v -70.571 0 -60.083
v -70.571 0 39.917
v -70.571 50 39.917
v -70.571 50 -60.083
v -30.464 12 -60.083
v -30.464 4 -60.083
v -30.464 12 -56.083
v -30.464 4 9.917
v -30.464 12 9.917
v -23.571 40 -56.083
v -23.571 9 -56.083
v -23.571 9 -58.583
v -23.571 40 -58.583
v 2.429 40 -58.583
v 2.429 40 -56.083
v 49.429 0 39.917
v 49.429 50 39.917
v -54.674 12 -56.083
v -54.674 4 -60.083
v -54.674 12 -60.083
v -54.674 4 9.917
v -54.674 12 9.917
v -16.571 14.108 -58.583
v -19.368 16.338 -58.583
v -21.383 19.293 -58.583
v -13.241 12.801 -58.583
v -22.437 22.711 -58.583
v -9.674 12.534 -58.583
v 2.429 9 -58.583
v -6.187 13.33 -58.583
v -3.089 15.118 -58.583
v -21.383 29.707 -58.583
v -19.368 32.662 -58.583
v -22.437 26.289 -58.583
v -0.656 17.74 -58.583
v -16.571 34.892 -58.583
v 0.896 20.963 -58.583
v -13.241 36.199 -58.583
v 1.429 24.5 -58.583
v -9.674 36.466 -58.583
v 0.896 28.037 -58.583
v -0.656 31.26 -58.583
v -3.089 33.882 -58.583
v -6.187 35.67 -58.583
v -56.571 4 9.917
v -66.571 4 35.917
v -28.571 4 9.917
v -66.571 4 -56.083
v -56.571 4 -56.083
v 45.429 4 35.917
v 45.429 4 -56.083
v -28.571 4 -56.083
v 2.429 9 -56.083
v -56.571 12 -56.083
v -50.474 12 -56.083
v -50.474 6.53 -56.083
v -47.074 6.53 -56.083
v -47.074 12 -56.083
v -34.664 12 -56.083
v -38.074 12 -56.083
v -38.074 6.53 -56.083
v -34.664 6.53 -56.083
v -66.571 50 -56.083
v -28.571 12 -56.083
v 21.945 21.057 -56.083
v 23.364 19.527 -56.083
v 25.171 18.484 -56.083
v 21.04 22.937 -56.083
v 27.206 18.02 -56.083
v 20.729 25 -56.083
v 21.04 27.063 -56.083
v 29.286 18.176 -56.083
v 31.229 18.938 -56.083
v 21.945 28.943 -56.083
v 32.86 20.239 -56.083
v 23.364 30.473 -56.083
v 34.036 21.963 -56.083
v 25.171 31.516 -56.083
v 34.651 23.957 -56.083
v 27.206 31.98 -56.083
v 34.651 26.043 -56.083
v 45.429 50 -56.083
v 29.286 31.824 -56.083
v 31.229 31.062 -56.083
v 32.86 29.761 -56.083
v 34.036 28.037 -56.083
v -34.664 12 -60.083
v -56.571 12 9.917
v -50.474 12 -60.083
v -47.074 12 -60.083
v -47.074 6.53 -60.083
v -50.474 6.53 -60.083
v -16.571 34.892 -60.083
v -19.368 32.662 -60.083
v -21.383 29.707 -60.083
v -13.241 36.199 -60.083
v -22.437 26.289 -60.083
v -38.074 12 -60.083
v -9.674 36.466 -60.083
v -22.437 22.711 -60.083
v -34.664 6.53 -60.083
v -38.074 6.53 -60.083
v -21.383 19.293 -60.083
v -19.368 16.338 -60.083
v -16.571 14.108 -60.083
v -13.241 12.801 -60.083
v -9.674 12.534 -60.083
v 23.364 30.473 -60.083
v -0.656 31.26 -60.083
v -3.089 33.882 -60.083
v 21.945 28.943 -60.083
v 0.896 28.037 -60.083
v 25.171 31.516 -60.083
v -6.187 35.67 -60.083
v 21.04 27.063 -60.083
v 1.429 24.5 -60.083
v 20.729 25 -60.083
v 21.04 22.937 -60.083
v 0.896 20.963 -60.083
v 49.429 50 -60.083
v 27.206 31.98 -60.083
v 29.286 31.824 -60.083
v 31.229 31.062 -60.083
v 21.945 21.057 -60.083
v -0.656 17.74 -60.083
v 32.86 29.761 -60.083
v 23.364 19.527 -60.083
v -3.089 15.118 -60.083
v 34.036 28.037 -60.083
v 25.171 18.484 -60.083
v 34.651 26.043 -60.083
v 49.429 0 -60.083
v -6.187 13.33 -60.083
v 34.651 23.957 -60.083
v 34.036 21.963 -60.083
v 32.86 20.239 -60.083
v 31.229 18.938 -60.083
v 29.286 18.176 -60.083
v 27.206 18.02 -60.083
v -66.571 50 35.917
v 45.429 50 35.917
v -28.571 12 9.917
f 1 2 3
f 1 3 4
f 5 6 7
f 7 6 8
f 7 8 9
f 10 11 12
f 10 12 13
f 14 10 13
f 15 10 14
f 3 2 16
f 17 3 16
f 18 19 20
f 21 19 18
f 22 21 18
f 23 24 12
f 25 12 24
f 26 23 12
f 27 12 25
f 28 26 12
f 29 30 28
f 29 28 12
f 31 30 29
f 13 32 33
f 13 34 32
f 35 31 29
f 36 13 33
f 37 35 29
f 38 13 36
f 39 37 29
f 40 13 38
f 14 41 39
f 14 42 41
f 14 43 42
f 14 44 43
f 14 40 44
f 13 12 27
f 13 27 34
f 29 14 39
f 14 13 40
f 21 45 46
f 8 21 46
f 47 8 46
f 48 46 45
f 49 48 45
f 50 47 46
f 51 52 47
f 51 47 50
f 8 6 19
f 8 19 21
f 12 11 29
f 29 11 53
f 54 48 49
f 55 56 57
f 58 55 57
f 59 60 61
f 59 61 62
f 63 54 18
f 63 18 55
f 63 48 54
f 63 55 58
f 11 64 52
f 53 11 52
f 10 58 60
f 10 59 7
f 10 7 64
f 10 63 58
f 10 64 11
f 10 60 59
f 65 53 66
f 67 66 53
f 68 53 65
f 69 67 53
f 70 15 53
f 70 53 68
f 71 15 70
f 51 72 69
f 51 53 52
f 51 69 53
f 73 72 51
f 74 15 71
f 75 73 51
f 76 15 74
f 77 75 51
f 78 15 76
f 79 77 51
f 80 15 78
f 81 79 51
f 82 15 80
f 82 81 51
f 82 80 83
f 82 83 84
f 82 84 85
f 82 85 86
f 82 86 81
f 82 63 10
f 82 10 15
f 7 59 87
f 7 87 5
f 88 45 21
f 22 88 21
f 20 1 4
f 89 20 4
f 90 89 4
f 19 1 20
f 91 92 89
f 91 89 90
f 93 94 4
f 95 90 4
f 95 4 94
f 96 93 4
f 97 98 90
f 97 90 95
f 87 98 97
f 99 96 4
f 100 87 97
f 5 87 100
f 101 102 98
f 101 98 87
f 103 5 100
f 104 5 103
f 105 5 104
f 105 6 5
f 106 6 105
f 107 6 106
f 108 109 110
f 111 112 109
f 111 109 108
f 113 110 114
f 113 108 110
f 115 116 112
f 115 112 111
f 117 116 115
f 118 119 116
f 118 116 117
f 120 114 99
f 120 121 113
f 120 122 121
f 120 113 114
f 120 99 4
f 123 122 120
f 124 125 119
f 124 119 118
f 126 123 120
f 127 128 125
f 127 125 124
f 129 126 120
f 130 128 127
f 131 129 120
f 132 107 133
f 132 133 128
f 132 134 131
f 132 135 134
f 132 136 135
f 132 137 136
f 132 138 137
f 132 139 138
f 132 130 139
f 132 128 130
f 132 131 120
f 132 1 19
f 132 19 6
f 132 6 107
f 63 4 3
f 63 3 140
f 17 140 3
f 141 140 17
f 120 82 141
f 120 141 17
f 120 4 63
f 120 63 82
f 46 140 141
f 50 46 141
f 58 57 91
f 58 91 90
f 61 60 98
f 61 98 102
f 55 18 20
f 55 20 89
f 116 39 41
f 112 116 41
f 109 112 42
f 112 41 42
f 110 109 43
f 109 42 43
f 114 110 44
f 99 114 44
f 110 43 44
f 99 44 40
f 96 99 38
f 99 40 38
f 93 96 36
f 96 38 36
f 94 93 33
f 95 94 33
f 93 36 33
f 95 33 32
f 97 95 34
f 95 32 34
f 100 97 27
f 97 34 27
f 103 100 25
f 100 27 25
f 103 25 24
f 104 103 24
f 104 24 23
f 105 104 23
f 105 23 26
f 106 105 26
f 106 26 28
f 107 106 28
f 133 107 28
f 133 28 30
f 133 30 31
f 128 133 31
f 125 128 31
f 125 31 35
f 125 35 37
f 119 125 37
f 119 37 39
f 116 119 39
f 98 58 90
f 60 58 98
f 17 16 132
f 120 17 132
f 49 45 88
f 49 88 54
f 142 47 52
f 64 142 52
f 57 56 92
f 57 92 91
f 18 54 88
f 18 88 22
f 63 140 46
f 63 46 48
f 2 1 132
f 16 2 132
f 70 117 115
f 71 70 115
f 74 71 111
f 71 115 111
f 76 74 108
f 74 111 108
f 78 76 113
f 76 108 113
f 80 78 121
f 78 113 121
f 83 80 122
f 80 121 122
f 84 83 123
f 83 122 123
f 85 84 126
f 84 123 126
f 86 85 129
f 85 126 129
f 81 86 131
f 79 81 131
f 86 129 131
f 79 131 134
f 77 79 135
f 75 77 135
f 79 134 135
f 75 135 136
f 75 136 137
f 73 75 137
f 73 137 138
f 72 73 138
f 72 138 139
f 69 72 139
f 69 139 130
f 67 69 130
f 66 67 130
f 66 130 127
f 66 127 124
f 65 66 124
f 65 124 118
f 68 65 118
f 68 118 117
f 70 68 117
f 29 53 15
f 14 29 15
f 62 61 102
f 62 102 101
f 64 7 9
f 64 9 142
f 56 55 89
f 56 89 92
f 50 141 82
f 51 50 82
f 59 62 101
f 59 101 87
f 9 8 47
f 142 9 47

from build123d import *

# Parameters (mm, degrees)
SKETCH1_W           = 120
SKETCH1_H           = 100
BOSS_EXTRUDE1_DEPTH = 50
SKETCH2_W           = 112
SKETCH2_H           = 92
CUT_EXTRUDE1_DEPTH  = 46
SKETCH3_W           = 28
SKETCH3_H           = 70
BOSS_EXTRUDE3_DEPTH = 8
SKETCH6_W           = 24.21
SKETCH6_H           = 8
CUT_EXTRUDE4_DEPTH  = 66
CUT_EXTRUDE6_DEPTH  = 66
SKETCH8_W           = 26
SKETCH8_H           = 31
CUT_EXTRUDE7_DEPTH  = 2.5
SKETCH9_R           = 12
CUT_EXTRUDE8_DEPTH  = 2.5
SKETCH10_R          = 7
CUT_EXTRUDE9_DEPTH  = 12.5


with BuildPart() as part:
    # Sketch1 → Boss-Extrude1 (new body)
    with BuildSketch(Plane(origin=(0, 0, 0), x_dir=(1, 0, 0), z_dir=(0, 1, 0))):
        with Locations((-10.571222942, 10.082692781)):
            Rectangle(SKETCH1_W, SKETCH1_H)
    extrude(amount=BOSS_EXTRUDE1_DEPTH)

    # Sketch2 → Cut-Extrude1 (cut)
    with BuildSketch(Plane(origin=(0, 50, 0), x_dir=(1, 0, 0), z_dir=(0, 1, 0))):
        with Locations((-10.571222942, 10.082692781)):
            Rectangle(SKETCH2_W, SKETCH2_H)
    extrude(amount=-CUT_EXTRUDE1_DEPTH, mode=Mode.SUBTRACT)

    # Sketch3 → Boss-Extrude3 (add)
    with BuildSketch(Plane(origin=(0, 4, 0), x_dir=(1, 0, 0), z_dir=(0, 1, 0))):
        with Locations((-42.571222942, 25.082692781)):
            Rectangle(SKETCH3_W, SKETCH3_H)
    extrude(amount=BOSS_EXTRUDE3_DEPTH)

    # Sketch6 → Cut-Extrude4 (cut)
    with BuildSketch(Plane.XY.offset(9.917307219)):
        with Locations((-42.569304131, 8)):
            Rectangle(SKETCH6_W, SKETCH6_H)
    extrude(amount=-CUT_EXTRUDE4_DEPTH, mode=Mode.SUBTRACT)

    # Sketch7 → Cut-Extrude6 (cut)
    with BuildSketch(Plane.XY.offset(-56.082692781)):
        Polygon((-54.674304131, 12), (-50.474304131, 12), (-50.474304131, 6.53), (-47.074304131, 6.53), (-47.074304131, 12), (-38.074304131, 12), (-38.074304131, 6.53), (-34.664304131, 6.53), (-34.664304131, 12), (-30.464304131, 12), (-30.464304131, 6.53), (-30.464304131, 4), (-54.674304131, 4), (-54.674304131, 6.53), align=None)
    extrude(amount=-CUT_EXTRUDE6_DEPTH, mode=Mode.SUBTRACT)

    # Sketch8 → Cut-Extrude7 (cut)
    with BuildSketch(Plane.XY.offset(-56.082692781)):
        with Locations((-10.571222942, 24.5)):
            Rectangle(SKETCH8_W, SKETCH8_H)
    extrude(amount=-CUT_EXTRUDE7_DEPTH, mode=Mode.SUBTRACT)

    # Sketch9 → Cut-Extrude8 (cut)
    with BuildSketch(Plane.XY.offset(-58.582692781)):
        with Locations((-10.571222942, 24.5)):
            Circle(SKETCH9_R)
    extrude(amount=-CUT_EXTRUDE8_DEPTH, mode=Mode.SUBTRACT)

    # Sketch10 → Cut-Extrude9 (cut)
    with BuildSketch(Plane(origin=(0, 0, -60.082692781), x_dir=(-1, 0, 0), z_dir=(0, 0, -1))):
        with Locations((-27.728777058, 25)):
            Circle(SKETCH10_R)
    extrude(amount=-CUT_EXTRUDE9_DEPTH, mode=Mode.SUBTRACT)


solid = part.part
